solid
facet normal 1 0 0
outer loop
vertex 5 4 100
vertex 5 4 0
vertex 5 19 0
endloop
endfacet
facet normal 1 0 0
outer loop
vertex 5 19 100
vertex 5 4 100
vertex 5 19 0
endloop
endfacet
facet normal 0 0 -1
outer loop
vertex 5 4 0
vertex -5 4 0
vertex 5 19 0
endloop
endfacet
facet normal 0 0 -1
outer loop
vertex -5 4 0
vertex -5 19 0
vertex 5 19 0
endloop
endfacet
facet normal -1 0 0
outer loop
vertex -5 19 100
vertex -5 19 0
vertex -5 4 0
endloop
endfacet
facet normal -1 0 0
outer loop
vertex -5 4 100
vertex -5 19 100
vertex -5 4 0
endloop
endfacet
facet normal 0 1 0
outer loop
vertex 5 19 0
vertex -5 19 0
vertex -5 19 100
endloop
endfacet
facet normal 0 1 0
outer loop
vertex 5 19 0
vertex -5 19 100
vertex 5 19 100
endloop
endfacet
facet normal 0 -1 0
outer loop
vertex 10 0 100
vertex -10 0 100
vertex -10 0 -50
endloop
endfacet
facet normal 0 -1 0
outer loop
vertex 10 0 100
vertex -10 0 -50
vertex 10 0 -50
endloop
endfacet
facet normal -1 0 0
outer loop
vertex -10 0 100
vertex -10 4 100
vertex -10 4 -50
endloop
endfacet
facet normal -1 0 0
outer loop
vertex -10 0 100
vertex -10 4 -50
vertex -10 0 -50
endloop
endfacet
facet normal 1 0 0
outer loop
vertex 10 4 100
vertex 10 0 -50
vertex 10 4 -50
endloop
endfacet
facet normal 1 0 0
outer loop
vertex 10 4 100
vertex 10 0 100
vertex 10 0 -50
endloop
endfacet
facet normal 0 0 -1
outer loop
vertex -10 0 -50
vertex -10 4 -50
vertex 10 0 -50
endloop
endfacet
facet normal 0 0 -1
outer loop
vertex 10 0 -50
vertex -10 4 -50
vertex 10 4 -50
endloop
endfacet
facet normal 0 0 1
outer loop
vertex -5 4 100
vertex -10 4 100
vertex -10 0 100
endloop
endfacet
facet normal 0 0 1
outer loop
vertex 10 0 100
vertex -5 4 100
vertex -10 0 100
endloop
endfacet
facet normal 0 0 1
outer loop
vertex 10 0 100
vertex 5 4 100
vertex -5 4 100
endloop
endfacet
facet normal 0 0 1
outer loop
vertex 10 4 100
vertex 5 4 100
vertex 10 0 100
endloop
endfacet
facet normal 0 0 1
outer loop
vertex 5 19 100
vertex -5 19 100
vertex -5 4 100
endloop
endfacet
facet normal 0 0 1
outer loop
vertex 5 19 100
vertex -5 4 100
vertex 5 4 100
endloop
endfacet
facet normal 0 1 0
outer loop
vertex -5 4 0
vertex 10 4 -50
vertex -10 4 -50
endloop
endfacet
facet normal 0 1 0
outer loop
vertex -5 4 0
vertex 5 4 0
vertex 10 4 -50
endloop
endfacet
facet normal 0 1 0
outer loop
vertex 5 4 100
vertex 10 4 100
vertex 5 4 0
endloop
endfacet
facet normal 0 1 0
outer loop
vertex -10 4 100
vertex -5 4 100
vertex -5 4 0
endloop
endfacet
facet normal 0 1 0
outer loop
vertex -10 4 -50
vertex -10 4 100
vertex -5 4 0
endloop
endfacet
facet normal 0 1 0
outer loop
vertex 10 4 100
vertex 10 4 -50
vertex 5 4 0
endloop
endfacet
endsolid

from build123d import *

# Parameters (mm, degrees)
BOSS_EXTRUDE1_DEPTH = 100
BOSS_EXTRUDE2_DEPTH = 50


with BuildPart() as part:
    # Sketch1 → Boss-Extrude1 (new body)
    with BuildSketch(Plane.XY):
        Polygon((-10, 0), (10, 0), (10, 4), (5, 4), (5, 19), (-5, 19), (-5, 4), (-10, 4), align=None)
    extrude(amount=BOSS_EXTRUDE1_DEPTH)

    # Sketch1<3> → Boss-Extrude2 (add)
    with BuildSketch(Plane.XY):
        Polygon((-10, 0), (10, 0), (10, 4), (5, 4), (-5, 4), (-10, 4), align=None)
    extrude(amount=-BOSS_EXTRUDE2_DEPTH)


solid = part.part
